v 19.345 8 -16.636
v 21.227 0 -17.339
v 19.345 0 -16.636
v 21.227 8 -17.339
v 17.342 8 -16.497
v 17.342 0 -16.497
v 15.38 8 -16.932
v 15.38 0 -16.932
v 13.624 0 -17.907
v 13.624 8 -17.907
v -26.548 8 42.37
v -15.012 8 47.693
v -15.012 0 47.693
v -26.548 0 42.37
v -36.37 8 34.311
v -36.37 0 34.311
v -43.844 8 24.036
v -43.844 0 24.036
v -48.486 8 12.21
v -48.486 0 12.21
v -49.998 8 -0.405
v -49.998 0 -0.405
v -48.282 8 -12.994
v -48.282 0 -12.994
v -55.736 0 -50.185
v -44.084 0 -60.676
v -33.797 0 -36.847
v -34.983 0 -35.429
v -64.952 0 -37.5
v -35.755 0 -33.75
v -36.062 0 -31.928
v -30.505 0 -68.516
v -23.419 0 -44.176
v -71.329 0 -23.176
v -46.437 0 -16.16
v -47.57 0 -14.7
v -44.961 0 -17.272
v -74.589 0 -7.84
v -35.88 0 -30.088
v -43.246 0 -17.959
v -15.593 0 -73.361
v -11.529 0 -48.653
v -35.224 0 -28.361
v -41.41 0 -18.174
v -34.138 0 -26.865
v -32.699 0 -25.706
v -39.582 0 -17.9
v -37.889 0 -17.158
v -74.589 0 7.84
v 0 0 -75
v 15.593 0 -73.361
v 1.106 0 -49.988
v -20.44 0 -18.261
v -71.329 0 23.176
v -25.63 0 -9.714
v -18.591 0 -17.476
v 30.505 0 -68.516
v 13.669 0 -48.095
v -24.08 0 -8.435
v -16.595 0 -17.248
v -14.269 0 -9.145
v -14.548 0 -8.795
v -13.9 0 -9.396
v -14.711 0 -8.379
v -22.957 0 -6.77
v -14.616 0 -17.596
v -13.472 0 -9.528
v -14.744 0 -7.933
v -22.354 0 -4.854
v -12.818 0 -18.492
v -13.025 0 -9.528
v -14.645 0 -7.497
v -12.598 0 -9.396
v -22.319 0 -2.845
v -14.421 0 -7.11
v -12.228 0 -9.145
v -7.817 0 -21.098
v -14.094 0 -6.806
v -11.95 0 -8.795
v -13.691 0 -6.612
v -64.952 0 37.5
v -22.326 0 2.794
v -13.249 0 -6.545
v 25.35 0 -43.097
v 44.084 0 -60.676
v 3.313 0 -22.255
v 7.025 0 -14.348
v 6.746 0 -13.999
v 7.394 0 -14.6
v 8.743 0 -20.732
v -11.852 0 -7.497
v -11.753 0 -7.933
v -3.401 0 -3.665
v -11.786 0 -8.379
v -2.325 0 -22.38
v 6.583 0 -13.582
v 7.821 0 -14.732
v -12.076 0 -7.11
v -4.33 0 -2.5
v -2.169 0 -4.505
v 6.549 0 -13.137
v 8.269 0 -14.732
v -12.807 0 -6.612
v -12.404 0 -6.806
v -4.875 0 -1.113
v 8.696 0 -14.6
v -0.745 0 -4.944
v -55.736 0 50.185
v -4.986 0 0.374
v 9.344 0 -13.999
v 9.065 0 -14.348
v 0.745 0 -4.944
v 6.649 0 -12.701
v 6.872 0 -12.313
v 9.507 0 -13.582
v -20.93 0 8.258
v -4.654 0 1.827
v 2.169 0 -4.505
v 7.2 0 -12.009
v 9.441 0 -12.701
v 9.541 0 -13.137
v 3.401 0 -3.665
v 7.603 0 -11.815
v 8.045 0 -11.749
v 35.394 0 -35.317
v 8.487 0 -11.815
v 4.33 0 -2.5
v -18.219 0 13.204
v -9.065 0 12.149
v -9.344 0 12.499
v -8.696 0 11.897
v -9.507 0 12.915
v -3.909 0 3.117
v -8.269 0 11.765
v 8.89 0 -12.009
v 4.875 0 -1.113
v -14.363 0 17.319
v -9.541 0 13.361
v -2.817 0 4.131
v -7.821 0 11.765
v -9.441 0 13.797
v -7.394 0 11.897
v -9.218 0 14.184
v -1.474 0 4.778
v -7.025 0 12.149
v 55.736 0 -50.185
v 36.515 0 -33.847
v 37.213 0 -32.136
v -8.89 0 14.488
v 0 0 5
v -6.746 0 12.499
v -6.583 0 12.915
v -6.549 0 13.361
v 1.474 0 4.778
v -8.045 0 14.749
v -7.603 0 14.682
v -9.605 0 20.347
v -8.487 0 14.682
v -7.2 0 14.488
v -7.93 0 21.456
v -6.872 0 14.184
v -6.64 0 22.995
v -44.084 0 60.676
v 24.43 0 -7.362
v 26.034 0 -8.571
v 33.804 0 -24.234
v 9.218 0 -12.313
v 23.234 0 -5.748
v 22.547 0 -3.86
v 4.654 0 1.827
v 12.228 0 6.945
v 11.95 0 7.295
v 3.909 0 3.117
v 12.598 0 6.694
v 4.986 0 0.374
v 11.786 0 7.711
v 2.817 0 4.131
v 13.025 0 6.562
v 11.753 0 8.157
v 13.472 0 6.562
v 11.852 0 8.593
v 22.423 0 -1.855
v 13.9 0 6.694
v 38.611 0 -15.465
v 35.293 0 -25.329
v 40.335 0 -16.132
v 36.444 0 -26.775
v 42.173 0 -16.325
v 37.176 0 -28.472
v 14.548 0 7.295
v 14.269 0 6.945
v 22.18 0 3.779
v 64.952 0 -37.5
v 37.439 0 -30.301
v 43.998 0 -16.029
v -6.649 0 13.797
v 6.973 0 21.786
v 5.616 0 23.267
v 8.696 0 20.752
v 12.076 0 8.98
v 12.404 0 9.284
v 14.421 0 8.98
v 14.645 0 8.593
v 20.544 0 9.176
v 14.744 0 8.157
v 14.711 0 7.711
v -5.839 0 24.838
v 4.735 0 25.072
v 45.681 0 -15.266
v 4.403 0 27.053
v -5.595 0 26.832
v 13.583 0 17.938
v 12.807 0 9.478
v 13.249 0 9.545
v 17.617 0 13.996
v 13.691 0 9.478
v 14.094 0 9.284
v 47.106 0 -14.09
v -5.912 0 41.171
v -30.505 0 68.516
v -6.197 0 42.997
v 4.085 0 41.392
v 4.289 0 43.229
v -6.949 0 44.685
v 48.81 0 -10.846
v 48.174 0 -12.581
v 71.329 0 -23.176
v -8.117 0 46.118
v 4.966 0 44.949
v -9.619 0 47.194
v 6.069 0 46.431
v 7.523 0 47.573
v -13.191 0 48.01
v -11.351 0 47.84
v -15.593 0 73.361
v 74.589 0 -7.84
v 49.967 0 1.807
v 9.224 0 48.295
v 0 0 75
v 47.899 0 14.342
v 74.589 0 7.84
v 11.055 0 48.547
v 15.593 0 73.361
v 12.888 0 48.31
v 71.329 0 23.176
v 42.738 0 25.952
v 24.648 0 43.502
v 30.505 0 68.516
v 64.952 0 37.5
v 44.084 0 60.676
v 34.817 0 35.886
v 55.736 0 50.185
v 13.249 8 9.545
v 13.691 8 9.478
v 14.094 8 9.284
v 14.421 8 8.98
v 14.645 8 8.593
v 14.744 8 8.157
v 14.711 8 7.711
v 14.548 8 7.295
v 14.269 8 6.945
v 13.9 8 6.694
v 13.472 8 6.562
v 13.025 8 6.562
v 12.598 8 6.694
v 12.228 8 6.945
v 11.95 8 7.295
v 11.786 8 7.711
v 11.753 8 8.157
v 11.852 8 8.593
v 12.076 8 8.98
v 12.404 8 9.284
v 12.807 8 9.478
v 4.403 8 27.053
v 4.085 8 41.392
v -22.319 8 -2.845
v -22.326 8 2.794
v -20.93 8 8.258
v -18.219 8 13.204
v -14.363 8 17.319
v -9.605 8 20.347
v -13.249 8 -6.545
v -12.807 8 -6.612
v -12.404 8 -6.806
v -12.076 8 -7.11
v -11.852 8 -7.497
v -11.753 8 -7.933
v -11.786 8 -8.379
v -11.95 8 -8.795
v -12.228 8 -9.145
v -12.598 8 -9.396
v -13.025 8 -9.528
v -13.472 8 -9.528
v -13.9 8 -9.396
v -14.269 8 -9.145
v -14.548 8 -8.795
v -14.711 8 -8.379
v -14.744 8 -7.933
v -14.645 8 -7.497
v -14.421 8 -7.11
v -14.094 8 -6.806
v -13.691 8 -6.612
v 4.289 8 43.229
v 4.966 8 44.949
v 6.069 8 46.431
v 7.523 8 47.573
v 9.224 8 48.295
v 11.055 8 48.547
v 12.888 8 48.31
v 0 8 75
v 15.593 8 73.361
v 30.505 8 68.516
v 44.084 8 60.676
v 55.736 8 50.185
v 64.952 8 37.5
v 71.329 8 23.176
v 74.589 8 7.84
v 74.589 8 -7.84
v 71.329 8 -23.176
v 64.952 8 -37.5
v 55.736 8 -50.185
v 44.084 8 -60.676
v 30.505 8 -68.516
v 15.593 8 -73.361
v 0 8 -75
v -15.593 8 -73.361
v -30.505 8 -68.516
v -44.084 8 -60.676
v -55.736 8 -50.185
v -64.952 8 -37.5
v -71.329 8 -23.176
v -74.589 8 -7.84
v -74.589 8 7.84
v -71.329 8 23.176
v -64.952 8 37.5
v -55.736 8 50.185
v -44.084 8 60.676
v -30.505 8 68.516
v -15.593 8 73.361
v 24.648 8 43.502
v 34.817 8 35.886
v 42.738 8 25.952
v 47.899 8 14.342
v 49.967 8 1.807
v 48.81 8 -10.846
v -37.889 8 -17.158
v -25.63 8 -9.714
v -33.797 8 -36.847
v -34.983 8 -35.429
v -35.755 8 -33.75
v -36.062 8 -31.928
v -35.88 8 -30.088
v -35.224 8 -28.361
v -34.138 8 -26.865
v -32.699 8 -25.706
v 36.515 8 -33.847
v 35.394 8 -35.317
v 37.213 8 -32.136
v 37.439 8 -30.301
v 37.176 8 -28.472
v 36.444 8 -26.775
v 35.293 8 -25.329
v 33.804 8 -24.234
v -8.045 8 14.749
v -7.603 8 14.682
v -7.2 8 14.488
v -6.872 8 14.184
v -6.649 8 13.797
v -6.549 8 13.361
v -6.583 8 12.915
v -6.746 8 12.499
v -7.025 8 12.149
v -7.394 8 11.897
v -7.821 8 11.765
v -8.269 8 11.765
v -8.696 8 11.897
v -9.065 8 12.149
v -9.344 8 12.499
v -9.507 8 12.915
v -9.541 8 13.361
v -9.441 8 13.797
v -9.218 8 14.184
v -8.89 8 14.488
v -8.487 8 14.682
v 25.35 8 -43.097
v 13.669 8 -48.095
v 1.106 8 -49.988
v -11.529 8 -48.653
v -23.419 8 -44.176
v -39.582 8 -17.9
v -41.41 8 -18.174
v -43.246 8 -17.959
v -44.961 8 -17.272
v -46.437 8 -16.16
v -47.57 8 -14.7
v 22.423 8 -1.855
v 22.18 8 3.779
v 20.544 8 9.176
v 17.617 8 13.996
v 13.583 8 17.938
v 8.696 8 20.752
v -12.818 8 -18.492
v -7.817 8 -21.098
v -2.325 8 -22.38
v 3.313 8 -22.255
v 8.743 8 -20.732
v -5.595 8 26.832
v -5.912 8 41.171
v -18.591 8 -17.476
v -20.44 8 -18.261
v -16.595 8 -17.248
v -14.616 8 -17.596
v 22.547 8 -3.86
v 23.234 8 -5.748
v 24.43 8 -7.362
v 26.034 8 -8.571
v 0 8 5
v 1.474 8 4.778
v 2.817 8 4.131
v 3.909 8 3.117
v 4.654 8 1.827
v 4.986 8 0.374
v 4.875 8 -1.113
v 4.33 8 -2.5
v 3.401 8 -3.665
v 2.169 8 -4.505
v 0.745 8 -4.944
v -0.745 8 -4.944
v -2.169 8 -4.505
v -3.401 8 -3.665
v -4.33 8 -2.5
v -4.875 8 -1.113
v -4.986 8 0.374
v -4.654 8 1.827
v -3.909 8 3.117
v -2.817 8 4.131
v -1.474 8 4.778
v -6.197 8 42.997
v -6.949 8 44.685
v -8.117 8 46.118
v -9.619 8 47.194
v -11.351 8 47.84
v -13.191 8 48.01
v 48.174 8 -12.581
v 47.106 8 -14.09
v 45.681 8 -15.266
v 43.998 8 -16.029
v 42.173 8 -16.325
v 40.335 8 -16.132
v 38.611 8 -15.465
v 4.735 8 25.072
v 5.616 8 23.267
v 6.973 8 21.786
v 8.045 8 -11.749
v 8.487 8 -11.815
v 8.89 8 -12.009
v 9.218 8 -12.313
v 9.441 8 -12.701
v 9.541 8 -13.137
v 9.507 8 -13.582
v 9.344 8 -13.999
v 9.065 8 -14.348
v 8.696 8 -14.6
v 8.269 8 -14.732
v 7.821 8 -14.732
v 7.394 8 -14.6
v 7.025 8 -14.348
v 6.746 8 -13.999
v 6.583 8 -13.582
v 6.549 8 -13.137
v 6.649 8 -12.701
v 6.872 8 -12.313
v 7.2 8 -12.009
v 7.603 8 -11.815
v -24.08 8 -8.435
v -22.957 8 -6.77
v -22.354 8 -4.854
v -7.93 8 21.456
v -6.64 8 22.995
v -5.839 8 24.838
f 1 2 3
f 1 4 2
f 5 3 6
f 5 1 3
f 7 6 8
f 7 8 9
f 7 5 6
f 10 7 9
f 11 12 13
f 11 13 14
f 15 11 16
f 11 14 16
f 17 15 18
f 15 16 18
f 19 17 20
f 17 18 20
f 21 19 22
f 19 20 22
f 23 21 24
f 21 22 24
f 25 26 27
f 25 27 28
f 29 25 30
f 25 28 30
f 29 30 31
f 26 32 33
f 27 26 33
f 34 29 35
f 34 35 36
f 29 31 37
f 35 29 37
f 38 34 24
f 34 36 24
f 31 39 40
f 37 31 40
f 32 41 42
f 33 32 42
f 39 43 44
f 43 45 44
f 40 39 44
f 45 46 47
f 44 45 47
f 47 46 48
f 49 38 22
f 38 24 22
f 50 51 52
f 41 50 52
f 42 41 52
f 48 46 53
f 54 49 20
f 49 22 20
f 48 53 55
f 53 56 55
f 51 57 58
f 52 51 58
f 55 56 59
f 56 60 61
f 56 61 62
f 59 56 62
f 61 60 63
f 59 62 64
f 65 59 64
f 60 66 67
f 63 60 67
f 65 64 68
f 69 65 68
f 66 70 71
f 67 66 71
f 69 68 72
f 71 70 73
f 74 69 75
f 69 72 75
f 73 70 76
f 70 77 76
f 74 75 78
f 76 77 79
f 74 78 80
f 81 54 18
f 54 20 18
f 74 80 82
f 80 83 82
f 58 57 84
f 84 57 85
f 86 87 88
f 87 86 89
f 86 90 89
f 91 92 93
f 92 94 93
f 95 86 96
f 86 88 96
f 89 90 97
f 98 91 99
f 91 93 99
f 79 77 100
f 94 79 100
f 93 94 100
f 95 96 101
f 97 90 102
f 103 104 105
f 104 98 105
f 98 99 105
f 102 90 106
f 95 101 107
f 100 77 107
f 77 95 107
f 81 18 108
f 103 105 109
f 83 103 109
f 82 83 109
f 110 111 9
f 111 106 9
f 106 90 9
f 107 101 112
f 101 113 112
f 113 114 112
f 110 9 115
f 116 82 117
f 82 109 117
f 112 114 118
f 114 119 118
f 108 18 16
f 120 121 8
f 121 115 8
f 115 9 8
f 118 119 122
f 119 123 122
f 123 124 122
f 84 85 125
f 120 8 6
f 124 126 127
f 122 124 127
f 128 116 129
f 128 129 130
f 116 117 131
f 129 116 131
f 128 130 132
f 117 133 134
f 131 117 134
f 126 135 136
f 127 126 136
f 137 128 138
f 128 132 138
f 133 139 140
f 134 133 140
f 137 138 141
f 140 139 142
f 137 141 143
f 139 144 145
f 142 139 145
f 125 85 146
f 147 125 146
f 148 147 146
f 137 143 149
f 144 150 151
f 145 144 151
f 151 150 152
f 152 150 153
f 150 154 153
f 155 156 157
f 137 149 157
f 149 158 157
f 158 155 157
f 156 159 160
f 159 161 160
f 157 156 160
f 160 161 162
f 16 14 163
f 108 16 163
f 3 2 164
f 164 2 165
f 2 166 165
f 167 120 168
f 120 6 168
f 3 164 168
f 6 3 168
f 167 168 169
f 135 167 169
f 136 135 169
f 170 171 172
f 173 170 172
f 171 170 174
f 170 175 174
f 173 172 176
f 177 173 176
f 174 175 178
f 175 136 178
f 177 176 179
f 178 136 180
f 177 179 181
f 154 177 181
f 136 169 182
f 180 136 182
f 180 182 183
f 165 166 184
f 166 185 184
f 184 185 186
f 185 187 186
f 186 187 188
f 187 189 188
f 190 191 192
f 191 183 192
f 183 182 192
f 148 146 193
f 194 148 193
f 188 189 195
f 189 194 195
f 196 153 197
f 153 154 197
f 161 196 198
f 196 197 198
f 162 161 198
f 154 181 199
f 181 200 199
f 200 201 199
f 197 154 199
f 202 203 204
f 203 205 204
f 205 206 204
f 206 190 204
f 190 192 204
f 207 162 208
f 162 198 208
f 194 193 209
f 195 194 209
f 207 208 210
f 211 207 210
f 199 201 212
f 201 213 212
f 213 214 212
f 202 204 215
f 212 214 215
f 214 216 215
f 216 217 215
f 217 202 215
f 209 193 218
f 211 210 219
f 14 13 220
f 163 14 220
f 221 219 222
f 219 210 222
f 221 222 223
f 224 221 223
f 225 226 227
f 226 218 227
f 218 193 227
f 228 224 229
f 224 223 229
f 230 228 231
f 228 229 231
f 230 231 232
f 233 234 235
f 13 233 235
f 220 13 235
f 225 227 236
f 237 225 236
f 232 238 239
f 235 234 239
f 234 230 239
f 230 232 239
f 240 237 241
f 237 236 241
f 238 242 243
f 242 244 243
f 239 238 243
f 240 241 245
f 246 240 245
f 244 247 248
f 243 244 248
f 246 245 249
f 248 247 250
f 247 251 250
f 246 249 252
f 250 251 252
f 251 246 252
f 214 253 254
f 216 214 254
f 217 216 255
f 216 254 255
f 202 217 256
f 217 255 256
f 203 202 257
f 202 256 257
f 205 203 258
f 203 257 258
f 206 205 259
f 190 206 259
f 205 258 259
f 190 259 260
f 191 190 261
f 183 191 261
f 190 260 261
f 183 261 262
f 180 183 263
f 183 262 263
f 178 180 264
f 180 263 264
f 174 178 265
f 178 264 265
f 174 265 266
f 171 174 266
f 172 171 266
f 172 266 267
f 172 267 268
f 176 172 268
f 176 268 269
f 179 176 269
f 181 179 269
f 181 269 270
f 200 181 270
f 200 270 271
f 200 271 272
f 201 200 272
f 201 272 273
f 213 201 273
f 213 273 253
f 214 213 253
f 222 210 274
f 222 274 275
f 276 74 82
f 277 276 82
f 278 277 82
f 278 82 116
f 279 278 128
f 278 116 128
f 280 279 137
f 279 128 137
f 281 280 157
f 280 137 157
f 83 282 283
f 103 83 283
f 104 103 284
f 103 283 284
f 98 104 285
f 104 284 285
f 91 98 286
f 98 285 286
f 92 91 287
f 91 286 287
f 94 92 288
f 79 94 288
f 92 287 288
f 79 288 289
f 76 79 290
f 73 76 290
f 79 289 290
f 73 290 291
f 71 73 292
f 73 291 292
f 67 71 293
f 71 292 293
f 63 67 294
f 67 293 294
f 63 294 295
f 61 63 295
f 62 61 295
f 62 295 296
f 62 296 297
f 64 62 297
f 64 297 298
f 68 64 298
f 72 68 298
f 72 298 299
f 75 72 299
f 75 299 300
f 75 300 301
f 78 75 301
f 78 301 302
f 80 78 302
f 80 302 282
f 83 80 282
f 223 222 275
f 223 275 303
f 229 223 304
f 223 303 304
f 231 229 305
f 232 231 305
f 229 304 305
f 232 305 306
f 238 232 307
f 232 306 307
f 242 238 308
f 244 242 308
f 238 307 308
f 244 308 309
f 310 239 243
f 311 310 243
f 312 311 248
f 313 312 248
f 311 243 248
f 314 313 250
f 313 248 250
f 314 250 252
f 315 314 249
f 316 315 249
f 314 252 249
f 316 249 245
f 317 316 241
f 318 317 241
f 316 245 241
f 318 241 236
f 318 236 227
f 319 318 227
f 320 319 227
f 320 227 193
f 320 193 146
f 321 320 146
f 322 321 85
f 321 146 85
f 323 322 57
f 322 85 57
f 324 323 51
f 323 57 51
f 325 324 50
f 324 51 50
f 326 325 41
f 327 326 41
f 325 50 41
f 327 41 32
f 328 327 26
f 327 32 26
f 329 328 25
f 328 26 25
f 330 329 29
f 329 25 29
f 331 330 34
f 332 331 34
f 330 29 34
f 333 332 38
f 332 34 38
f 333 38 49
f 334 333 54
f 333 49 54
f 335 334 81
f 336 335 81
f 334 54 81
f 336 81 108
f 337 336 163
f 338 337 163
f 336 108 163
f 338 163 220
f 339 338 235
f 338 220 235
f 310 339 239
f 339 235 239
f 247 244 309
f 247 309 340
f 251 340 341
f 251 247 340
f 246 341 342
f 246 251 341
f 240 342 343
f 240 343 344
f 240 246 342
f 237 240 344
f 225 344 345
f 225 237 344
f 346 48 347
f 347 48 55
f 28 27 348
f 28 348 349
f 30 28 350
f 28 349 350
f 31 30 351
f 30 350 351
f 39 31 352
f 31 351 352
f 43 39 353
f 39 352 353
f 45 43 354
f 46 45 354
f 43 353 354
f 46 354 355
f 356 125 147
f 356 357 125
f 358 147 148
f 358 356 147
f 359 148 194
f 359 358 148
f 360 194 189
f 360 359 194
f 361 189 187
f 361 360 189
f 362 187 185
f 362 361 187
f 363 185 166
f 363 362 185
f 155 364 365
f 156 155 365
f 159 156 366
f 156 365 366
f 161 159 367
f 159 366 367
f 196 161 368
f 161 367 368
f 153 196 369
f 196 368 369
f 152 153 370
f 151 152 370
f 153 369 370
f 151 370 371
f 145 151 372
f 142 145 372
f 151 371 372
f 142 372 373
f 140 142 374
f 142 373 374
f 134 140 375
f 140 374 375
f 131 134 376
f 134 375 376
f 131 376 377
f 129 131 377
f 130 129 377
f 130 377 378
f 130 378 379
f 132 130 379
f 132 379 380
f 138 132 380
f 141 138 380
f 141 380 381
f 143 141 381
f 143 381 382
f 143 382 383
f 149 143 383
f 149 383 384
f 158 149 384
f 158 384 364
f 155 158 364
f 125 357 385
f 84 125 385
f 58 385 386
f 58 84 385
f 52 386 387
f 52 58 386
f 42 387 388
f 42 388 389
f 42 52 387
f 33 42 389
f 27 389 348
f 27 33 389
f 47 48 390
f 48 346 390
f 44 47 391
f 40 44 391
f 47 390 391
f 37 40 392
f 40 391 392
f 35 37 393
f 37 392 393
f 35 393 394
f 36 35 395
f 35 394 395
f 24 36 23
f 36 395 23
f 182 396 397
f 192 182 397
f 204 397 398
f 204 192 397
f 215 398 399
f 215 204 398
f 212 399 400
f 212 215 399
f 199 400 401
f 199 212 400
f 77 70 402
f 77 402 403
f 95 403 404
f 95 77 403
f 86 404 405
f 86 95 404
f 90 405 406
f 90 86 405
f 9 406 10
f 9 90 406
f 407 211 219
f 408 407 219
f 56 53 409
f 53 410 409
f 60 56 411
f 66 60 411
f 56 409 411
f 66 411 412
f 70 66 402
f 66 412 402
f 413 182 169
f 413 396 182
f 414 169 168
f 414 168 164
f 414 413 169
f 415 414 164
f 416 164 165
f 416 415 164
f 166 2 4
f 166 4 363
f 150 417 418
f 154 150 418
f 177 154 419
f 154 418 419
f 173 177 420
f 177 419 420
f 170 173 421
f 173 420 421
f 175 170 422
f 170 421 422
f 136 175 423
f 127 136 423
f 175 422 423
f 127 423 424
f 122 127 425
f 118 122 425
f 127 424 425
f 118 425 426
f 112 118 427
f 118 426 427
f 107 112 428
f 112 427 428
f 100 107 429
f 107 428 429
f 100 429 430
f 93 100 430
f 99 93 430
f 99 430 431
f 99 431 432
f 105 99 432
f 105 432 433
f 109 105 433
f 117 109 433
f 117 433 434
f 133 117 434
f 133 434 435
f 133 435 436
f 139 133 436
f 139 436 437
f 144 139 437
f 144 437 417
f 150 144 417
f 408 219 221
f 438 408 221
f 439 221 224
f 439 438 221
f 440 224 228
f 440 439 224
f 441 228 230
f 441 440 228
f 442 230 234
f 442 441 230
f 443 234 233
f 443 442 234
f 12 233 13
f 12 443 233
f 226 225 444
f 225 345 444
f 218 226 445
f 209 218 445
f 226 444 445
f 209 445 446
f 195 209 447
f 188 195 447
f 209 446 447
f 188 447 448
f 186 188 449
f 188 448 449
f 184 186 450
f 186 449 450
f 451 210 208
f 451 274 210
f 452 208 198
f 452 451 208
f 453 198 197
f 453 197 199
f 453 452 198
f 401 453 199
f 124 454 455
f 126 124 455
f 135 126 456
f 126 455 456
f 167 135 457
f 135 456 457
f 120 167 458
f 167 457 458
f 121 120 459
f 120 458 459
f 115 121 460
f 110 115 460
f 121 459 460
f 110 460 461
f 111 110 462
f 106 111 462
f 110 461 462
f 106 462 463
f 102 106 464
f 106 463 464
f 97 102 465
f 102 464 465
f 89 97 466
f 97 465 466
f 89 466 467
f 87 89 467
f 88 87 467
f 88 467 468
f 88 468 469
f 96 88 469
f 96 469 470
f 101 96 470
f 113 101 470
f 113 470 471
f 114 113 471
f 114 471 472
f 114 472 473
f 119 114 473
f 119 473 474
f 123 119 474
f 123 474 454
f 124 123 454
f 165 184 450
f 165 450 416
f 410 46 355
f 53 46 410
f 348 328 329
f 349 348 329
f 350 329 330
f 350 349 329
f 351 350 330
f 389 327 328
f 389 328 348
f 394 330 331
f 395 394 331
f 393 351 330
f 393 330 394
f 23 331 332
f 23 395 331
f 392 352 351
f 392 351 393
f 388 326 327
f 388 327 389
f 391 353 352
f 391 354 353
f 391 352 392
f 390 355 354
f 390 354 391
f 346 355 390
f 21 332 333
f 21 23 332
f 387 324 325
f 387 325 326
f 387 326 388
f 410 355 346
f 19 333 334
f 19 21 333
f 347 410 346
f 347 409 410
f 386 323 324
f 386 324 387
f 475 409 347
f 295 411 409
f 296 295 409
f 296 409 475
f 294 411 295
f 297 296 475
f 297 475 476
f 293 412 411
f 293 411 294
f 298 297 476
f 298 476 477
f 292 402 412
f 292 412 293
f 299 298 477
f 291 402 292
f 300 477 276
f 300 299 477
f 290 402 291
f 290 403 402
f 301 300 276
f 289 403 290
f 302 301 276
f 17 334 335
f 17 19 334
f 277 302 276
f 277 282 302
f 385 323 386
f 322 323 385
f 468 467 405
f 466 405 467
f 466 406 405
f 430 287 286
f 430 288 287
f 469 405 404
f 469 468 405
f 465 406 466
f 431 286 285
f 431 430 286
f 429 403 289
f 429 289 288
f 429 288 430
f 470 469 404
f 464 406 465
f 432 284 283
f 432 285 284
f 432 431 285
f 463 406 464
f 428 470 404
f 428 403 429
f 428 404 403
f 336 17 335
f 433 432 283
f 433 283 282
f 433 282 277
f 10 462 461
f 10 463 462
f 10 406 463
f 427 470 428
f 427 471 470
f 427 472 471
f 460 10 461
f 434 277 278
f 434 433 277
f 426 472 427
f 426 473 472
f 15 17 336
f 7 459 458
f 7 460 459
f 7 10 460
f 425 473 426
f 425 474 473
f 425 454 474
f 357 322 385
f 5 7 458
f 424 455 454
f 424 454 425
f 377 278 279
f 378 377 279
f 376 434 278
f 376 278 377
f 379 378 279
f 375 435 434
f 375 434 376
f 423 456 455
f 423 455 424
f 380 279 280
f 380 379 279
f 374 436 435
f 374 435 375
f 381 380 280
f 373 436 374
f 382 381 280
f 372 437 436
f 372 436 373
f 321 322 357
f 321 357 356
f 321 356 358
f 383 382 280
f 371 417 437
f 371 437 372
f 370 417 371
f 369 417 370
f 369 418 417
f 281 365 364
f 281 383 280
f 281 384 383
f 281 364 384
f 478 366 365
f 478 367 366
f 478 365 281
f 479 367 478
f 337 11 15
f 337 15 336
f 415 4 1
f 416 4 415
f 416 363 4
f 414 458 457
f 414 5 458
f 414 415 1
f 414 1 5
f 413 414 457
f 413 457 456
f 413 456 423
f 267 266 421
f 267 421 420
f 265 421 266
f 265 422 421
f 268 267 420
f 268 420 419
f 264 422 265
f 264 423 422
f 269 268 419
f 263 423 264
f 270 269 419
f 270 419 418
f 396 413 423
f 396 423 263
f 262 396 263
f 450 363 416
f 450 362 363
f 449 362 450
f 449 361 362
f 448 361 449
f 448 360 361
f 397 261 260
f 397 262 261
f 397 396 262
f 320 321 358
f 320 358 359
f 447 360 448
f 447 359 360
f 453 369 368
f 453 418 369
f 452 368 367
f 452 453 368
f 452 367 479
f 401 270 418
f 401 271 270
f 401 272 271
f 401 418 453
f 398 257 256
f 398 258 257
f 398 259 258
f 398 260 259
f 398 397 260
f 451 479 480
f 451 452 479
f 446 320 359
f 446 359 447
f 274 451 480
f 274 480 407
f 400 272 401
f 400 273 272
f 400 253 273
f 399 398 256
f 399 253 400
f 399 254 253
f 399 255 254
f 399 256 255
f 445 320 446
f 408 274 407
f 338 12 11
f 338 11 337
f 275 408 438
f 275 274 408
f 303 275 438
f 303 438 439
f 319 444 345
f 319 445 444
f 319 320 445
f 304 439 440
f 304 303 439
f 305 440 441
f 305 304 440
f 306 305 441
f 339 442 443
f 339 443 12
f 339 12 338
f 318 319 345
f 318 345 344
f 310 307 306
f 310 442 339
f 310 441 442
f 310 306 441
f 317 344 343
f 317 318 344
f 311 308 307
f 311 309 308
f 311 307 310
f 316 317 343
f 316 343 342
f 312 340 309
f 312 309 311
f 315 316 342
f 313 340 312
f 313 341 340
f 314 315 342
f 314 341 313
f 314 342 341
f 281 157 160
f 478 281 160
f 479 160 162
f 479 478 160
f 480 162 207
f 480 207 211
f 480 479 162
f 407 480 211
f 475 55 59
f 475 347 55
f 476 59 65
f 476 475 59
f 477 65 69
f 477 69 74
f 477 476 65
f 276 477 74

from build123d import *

# Parameters (mm, degrees)
SKETCH_1_R          = 75
EXTRUDE_1_DEPTH     = 8
FILLET_1_R          = 7
FILLET_2_R          = 7
FILLET_3_R          = 7
SKETCH_2_R          = 5
CUT_EXTRUDE_1_DEPTH = 10
SKETCH_3_R          = 1.5
CUT_EXTRUDE_2_DEPTH = 10
FILLET_4_R          = 7


with BuildPart() as part:
    # 草图1 → 凸台-拉伸1 (new body)
    with BuildSketch(Plane(origin=(0, 0, 0), x_dir=(1, 0, 0), z_dir=(0, 1, 0))):
        with Locations(Location((0, 0, 0), (0, 0, 270))):
            Circle(SKETCH_1_R)
        with BuildLine():
            Line((-5.48403898, -21.821441668), (-6.099248264, -49.626597411))
            ThreePointArc((-6.099248264, -49.626597411), (-43.843682887, -24.036045242), (-45.11861404, 21.547869201))
            Line((-45.11861404, 21.547869201), (-21.346247453, 7.11250446))
            ThreePointArc((-21.346247453, 7.11250446), (-19.729657299, -10.816220359), (-5.48403898, -21.821441668))
        make_face(mode=Mode.SUBTRACT)
        with BuildLine():
            Line((-39.928269929, 30.095402646), (-16.155903342, 15.660037906))
            ThreePointArc((-16.155903342, 15.660037906), (0.497707046, 22.494494609), (16.832733273, 14.930140339))
            Line((16.832733273, 14.930140339), (41.220309145, 28.299931342))
            ThreePointArc((41.220309145, 28.299931342), (1.106015658, 49.987765797), (-39.928269929, 30.095402646))
        make_face(mode=Mode.SUBTRACT)
        with BuildLine():
            Line((4.513514179, -22.042644799), (3.898304895, -49.847800543))
            ThreePointArc((3.898304895, -49.847800543), (42.73766723, -25.951720555), (46.027518194, 19.531194765))
            Line((46.027518194, 19.531194765), (21.639942322, 6.161403762))
            ThreePointArc((21.639942322, 6.161403762), (19.231950253, -11.67827425), (4.513514179, -22.042644799))
        make_face(mode=Mode.SUBTRACT)
    extrude(amount=EXTRUDE_1_DEPTH)

    # 圆角1
    fillet_1_edges = [part.edges().sort_by_distance(p)[0] for p in [
        (41.220309145, 4, -28.299931342),
    ]]
    fillet(fillet_1_edges, radius=FILLET_1_R)

    # 圆角2
    fillet_2_edges = [part.edges().sort_by_distance(p)[0] for p in [
        (-39.928269929, 4, -30.095402646),
    ]]
    fillet(fillet_2_edges, radius=FILLET_2_R)

    # 圆角3
    fillet_3_edges = [part.edges().sort_by_distance(p)[0] for p in [
        (3.898304895, 4, 49.847800543),
        (46.027518194, 4, -19.531194765),
        (-45.11861404, 4, -21.547869201),
        (-6.099248264, 4, 49.626597411),
    ]]
    fillet(fillet_3_edges, radius=FILLET_3_R)

    # 草图2 → 切除-拉伸1 (cut)
    with BuildSketch(Plane(origin=(0, 8, 0), x_dir=(1, 0, 0), z_dir=(0, 1, 0))):
        with Locations(Location((0, 0, 0), (0, 0, 270))):
            Circle(SKETCH_2_R)
    extrude(amount=-CUT_EXTRUDE_1_DEPTH, mode=Mode.SUBTRACT)

    # 草图3 → 切除-拉伸2 (cut)
    with BuildSketch(Plane(origin=(0, 8, 0), x_dir=(1, 0, 0), z_dir=(0, 1, 0))):
        with Locations(Location((-13.248676841, 8.045033372, 0), (0, 0, 270))):
            Circle(SKETCH_3_R)
        with Locations(Location((8.045033372, 13.248676841, 0), (0, 0, 270))):
            Circle(SKETCH_3_R)
        with Locations(Location((13.248676841, -8.045033372, 0), (0, 0, 270))):
            Circle(SKETCH_3_R)
        with Locations(Location((-8.045033372, -13.248676841, 0), (0, 0, 270))):
            Circle(SKETCH_3_R)
    extrude(amount=-CUT_EXTRUDE_2_DEPTH, mode=Mode.SUBTRACT)

    # 圆角4
    fillet_4_edges = [part.edges().sort_by_distance(p)[0] for p in [
        (-16.155903342, 4, -15.660037906),
        (16.832733273, 4, -14.930140339),
        (21.639942322, 4, -6.161403762),
        (4.513514179, 4, 22.042644799),
        (-5.48403898, 4, 21.821441668),
        (-21.346247453, 4, -7.11250446),
    ]]
    fillet(fillet_4_edges, radius=FILLET_4_R)


solid = part.part
